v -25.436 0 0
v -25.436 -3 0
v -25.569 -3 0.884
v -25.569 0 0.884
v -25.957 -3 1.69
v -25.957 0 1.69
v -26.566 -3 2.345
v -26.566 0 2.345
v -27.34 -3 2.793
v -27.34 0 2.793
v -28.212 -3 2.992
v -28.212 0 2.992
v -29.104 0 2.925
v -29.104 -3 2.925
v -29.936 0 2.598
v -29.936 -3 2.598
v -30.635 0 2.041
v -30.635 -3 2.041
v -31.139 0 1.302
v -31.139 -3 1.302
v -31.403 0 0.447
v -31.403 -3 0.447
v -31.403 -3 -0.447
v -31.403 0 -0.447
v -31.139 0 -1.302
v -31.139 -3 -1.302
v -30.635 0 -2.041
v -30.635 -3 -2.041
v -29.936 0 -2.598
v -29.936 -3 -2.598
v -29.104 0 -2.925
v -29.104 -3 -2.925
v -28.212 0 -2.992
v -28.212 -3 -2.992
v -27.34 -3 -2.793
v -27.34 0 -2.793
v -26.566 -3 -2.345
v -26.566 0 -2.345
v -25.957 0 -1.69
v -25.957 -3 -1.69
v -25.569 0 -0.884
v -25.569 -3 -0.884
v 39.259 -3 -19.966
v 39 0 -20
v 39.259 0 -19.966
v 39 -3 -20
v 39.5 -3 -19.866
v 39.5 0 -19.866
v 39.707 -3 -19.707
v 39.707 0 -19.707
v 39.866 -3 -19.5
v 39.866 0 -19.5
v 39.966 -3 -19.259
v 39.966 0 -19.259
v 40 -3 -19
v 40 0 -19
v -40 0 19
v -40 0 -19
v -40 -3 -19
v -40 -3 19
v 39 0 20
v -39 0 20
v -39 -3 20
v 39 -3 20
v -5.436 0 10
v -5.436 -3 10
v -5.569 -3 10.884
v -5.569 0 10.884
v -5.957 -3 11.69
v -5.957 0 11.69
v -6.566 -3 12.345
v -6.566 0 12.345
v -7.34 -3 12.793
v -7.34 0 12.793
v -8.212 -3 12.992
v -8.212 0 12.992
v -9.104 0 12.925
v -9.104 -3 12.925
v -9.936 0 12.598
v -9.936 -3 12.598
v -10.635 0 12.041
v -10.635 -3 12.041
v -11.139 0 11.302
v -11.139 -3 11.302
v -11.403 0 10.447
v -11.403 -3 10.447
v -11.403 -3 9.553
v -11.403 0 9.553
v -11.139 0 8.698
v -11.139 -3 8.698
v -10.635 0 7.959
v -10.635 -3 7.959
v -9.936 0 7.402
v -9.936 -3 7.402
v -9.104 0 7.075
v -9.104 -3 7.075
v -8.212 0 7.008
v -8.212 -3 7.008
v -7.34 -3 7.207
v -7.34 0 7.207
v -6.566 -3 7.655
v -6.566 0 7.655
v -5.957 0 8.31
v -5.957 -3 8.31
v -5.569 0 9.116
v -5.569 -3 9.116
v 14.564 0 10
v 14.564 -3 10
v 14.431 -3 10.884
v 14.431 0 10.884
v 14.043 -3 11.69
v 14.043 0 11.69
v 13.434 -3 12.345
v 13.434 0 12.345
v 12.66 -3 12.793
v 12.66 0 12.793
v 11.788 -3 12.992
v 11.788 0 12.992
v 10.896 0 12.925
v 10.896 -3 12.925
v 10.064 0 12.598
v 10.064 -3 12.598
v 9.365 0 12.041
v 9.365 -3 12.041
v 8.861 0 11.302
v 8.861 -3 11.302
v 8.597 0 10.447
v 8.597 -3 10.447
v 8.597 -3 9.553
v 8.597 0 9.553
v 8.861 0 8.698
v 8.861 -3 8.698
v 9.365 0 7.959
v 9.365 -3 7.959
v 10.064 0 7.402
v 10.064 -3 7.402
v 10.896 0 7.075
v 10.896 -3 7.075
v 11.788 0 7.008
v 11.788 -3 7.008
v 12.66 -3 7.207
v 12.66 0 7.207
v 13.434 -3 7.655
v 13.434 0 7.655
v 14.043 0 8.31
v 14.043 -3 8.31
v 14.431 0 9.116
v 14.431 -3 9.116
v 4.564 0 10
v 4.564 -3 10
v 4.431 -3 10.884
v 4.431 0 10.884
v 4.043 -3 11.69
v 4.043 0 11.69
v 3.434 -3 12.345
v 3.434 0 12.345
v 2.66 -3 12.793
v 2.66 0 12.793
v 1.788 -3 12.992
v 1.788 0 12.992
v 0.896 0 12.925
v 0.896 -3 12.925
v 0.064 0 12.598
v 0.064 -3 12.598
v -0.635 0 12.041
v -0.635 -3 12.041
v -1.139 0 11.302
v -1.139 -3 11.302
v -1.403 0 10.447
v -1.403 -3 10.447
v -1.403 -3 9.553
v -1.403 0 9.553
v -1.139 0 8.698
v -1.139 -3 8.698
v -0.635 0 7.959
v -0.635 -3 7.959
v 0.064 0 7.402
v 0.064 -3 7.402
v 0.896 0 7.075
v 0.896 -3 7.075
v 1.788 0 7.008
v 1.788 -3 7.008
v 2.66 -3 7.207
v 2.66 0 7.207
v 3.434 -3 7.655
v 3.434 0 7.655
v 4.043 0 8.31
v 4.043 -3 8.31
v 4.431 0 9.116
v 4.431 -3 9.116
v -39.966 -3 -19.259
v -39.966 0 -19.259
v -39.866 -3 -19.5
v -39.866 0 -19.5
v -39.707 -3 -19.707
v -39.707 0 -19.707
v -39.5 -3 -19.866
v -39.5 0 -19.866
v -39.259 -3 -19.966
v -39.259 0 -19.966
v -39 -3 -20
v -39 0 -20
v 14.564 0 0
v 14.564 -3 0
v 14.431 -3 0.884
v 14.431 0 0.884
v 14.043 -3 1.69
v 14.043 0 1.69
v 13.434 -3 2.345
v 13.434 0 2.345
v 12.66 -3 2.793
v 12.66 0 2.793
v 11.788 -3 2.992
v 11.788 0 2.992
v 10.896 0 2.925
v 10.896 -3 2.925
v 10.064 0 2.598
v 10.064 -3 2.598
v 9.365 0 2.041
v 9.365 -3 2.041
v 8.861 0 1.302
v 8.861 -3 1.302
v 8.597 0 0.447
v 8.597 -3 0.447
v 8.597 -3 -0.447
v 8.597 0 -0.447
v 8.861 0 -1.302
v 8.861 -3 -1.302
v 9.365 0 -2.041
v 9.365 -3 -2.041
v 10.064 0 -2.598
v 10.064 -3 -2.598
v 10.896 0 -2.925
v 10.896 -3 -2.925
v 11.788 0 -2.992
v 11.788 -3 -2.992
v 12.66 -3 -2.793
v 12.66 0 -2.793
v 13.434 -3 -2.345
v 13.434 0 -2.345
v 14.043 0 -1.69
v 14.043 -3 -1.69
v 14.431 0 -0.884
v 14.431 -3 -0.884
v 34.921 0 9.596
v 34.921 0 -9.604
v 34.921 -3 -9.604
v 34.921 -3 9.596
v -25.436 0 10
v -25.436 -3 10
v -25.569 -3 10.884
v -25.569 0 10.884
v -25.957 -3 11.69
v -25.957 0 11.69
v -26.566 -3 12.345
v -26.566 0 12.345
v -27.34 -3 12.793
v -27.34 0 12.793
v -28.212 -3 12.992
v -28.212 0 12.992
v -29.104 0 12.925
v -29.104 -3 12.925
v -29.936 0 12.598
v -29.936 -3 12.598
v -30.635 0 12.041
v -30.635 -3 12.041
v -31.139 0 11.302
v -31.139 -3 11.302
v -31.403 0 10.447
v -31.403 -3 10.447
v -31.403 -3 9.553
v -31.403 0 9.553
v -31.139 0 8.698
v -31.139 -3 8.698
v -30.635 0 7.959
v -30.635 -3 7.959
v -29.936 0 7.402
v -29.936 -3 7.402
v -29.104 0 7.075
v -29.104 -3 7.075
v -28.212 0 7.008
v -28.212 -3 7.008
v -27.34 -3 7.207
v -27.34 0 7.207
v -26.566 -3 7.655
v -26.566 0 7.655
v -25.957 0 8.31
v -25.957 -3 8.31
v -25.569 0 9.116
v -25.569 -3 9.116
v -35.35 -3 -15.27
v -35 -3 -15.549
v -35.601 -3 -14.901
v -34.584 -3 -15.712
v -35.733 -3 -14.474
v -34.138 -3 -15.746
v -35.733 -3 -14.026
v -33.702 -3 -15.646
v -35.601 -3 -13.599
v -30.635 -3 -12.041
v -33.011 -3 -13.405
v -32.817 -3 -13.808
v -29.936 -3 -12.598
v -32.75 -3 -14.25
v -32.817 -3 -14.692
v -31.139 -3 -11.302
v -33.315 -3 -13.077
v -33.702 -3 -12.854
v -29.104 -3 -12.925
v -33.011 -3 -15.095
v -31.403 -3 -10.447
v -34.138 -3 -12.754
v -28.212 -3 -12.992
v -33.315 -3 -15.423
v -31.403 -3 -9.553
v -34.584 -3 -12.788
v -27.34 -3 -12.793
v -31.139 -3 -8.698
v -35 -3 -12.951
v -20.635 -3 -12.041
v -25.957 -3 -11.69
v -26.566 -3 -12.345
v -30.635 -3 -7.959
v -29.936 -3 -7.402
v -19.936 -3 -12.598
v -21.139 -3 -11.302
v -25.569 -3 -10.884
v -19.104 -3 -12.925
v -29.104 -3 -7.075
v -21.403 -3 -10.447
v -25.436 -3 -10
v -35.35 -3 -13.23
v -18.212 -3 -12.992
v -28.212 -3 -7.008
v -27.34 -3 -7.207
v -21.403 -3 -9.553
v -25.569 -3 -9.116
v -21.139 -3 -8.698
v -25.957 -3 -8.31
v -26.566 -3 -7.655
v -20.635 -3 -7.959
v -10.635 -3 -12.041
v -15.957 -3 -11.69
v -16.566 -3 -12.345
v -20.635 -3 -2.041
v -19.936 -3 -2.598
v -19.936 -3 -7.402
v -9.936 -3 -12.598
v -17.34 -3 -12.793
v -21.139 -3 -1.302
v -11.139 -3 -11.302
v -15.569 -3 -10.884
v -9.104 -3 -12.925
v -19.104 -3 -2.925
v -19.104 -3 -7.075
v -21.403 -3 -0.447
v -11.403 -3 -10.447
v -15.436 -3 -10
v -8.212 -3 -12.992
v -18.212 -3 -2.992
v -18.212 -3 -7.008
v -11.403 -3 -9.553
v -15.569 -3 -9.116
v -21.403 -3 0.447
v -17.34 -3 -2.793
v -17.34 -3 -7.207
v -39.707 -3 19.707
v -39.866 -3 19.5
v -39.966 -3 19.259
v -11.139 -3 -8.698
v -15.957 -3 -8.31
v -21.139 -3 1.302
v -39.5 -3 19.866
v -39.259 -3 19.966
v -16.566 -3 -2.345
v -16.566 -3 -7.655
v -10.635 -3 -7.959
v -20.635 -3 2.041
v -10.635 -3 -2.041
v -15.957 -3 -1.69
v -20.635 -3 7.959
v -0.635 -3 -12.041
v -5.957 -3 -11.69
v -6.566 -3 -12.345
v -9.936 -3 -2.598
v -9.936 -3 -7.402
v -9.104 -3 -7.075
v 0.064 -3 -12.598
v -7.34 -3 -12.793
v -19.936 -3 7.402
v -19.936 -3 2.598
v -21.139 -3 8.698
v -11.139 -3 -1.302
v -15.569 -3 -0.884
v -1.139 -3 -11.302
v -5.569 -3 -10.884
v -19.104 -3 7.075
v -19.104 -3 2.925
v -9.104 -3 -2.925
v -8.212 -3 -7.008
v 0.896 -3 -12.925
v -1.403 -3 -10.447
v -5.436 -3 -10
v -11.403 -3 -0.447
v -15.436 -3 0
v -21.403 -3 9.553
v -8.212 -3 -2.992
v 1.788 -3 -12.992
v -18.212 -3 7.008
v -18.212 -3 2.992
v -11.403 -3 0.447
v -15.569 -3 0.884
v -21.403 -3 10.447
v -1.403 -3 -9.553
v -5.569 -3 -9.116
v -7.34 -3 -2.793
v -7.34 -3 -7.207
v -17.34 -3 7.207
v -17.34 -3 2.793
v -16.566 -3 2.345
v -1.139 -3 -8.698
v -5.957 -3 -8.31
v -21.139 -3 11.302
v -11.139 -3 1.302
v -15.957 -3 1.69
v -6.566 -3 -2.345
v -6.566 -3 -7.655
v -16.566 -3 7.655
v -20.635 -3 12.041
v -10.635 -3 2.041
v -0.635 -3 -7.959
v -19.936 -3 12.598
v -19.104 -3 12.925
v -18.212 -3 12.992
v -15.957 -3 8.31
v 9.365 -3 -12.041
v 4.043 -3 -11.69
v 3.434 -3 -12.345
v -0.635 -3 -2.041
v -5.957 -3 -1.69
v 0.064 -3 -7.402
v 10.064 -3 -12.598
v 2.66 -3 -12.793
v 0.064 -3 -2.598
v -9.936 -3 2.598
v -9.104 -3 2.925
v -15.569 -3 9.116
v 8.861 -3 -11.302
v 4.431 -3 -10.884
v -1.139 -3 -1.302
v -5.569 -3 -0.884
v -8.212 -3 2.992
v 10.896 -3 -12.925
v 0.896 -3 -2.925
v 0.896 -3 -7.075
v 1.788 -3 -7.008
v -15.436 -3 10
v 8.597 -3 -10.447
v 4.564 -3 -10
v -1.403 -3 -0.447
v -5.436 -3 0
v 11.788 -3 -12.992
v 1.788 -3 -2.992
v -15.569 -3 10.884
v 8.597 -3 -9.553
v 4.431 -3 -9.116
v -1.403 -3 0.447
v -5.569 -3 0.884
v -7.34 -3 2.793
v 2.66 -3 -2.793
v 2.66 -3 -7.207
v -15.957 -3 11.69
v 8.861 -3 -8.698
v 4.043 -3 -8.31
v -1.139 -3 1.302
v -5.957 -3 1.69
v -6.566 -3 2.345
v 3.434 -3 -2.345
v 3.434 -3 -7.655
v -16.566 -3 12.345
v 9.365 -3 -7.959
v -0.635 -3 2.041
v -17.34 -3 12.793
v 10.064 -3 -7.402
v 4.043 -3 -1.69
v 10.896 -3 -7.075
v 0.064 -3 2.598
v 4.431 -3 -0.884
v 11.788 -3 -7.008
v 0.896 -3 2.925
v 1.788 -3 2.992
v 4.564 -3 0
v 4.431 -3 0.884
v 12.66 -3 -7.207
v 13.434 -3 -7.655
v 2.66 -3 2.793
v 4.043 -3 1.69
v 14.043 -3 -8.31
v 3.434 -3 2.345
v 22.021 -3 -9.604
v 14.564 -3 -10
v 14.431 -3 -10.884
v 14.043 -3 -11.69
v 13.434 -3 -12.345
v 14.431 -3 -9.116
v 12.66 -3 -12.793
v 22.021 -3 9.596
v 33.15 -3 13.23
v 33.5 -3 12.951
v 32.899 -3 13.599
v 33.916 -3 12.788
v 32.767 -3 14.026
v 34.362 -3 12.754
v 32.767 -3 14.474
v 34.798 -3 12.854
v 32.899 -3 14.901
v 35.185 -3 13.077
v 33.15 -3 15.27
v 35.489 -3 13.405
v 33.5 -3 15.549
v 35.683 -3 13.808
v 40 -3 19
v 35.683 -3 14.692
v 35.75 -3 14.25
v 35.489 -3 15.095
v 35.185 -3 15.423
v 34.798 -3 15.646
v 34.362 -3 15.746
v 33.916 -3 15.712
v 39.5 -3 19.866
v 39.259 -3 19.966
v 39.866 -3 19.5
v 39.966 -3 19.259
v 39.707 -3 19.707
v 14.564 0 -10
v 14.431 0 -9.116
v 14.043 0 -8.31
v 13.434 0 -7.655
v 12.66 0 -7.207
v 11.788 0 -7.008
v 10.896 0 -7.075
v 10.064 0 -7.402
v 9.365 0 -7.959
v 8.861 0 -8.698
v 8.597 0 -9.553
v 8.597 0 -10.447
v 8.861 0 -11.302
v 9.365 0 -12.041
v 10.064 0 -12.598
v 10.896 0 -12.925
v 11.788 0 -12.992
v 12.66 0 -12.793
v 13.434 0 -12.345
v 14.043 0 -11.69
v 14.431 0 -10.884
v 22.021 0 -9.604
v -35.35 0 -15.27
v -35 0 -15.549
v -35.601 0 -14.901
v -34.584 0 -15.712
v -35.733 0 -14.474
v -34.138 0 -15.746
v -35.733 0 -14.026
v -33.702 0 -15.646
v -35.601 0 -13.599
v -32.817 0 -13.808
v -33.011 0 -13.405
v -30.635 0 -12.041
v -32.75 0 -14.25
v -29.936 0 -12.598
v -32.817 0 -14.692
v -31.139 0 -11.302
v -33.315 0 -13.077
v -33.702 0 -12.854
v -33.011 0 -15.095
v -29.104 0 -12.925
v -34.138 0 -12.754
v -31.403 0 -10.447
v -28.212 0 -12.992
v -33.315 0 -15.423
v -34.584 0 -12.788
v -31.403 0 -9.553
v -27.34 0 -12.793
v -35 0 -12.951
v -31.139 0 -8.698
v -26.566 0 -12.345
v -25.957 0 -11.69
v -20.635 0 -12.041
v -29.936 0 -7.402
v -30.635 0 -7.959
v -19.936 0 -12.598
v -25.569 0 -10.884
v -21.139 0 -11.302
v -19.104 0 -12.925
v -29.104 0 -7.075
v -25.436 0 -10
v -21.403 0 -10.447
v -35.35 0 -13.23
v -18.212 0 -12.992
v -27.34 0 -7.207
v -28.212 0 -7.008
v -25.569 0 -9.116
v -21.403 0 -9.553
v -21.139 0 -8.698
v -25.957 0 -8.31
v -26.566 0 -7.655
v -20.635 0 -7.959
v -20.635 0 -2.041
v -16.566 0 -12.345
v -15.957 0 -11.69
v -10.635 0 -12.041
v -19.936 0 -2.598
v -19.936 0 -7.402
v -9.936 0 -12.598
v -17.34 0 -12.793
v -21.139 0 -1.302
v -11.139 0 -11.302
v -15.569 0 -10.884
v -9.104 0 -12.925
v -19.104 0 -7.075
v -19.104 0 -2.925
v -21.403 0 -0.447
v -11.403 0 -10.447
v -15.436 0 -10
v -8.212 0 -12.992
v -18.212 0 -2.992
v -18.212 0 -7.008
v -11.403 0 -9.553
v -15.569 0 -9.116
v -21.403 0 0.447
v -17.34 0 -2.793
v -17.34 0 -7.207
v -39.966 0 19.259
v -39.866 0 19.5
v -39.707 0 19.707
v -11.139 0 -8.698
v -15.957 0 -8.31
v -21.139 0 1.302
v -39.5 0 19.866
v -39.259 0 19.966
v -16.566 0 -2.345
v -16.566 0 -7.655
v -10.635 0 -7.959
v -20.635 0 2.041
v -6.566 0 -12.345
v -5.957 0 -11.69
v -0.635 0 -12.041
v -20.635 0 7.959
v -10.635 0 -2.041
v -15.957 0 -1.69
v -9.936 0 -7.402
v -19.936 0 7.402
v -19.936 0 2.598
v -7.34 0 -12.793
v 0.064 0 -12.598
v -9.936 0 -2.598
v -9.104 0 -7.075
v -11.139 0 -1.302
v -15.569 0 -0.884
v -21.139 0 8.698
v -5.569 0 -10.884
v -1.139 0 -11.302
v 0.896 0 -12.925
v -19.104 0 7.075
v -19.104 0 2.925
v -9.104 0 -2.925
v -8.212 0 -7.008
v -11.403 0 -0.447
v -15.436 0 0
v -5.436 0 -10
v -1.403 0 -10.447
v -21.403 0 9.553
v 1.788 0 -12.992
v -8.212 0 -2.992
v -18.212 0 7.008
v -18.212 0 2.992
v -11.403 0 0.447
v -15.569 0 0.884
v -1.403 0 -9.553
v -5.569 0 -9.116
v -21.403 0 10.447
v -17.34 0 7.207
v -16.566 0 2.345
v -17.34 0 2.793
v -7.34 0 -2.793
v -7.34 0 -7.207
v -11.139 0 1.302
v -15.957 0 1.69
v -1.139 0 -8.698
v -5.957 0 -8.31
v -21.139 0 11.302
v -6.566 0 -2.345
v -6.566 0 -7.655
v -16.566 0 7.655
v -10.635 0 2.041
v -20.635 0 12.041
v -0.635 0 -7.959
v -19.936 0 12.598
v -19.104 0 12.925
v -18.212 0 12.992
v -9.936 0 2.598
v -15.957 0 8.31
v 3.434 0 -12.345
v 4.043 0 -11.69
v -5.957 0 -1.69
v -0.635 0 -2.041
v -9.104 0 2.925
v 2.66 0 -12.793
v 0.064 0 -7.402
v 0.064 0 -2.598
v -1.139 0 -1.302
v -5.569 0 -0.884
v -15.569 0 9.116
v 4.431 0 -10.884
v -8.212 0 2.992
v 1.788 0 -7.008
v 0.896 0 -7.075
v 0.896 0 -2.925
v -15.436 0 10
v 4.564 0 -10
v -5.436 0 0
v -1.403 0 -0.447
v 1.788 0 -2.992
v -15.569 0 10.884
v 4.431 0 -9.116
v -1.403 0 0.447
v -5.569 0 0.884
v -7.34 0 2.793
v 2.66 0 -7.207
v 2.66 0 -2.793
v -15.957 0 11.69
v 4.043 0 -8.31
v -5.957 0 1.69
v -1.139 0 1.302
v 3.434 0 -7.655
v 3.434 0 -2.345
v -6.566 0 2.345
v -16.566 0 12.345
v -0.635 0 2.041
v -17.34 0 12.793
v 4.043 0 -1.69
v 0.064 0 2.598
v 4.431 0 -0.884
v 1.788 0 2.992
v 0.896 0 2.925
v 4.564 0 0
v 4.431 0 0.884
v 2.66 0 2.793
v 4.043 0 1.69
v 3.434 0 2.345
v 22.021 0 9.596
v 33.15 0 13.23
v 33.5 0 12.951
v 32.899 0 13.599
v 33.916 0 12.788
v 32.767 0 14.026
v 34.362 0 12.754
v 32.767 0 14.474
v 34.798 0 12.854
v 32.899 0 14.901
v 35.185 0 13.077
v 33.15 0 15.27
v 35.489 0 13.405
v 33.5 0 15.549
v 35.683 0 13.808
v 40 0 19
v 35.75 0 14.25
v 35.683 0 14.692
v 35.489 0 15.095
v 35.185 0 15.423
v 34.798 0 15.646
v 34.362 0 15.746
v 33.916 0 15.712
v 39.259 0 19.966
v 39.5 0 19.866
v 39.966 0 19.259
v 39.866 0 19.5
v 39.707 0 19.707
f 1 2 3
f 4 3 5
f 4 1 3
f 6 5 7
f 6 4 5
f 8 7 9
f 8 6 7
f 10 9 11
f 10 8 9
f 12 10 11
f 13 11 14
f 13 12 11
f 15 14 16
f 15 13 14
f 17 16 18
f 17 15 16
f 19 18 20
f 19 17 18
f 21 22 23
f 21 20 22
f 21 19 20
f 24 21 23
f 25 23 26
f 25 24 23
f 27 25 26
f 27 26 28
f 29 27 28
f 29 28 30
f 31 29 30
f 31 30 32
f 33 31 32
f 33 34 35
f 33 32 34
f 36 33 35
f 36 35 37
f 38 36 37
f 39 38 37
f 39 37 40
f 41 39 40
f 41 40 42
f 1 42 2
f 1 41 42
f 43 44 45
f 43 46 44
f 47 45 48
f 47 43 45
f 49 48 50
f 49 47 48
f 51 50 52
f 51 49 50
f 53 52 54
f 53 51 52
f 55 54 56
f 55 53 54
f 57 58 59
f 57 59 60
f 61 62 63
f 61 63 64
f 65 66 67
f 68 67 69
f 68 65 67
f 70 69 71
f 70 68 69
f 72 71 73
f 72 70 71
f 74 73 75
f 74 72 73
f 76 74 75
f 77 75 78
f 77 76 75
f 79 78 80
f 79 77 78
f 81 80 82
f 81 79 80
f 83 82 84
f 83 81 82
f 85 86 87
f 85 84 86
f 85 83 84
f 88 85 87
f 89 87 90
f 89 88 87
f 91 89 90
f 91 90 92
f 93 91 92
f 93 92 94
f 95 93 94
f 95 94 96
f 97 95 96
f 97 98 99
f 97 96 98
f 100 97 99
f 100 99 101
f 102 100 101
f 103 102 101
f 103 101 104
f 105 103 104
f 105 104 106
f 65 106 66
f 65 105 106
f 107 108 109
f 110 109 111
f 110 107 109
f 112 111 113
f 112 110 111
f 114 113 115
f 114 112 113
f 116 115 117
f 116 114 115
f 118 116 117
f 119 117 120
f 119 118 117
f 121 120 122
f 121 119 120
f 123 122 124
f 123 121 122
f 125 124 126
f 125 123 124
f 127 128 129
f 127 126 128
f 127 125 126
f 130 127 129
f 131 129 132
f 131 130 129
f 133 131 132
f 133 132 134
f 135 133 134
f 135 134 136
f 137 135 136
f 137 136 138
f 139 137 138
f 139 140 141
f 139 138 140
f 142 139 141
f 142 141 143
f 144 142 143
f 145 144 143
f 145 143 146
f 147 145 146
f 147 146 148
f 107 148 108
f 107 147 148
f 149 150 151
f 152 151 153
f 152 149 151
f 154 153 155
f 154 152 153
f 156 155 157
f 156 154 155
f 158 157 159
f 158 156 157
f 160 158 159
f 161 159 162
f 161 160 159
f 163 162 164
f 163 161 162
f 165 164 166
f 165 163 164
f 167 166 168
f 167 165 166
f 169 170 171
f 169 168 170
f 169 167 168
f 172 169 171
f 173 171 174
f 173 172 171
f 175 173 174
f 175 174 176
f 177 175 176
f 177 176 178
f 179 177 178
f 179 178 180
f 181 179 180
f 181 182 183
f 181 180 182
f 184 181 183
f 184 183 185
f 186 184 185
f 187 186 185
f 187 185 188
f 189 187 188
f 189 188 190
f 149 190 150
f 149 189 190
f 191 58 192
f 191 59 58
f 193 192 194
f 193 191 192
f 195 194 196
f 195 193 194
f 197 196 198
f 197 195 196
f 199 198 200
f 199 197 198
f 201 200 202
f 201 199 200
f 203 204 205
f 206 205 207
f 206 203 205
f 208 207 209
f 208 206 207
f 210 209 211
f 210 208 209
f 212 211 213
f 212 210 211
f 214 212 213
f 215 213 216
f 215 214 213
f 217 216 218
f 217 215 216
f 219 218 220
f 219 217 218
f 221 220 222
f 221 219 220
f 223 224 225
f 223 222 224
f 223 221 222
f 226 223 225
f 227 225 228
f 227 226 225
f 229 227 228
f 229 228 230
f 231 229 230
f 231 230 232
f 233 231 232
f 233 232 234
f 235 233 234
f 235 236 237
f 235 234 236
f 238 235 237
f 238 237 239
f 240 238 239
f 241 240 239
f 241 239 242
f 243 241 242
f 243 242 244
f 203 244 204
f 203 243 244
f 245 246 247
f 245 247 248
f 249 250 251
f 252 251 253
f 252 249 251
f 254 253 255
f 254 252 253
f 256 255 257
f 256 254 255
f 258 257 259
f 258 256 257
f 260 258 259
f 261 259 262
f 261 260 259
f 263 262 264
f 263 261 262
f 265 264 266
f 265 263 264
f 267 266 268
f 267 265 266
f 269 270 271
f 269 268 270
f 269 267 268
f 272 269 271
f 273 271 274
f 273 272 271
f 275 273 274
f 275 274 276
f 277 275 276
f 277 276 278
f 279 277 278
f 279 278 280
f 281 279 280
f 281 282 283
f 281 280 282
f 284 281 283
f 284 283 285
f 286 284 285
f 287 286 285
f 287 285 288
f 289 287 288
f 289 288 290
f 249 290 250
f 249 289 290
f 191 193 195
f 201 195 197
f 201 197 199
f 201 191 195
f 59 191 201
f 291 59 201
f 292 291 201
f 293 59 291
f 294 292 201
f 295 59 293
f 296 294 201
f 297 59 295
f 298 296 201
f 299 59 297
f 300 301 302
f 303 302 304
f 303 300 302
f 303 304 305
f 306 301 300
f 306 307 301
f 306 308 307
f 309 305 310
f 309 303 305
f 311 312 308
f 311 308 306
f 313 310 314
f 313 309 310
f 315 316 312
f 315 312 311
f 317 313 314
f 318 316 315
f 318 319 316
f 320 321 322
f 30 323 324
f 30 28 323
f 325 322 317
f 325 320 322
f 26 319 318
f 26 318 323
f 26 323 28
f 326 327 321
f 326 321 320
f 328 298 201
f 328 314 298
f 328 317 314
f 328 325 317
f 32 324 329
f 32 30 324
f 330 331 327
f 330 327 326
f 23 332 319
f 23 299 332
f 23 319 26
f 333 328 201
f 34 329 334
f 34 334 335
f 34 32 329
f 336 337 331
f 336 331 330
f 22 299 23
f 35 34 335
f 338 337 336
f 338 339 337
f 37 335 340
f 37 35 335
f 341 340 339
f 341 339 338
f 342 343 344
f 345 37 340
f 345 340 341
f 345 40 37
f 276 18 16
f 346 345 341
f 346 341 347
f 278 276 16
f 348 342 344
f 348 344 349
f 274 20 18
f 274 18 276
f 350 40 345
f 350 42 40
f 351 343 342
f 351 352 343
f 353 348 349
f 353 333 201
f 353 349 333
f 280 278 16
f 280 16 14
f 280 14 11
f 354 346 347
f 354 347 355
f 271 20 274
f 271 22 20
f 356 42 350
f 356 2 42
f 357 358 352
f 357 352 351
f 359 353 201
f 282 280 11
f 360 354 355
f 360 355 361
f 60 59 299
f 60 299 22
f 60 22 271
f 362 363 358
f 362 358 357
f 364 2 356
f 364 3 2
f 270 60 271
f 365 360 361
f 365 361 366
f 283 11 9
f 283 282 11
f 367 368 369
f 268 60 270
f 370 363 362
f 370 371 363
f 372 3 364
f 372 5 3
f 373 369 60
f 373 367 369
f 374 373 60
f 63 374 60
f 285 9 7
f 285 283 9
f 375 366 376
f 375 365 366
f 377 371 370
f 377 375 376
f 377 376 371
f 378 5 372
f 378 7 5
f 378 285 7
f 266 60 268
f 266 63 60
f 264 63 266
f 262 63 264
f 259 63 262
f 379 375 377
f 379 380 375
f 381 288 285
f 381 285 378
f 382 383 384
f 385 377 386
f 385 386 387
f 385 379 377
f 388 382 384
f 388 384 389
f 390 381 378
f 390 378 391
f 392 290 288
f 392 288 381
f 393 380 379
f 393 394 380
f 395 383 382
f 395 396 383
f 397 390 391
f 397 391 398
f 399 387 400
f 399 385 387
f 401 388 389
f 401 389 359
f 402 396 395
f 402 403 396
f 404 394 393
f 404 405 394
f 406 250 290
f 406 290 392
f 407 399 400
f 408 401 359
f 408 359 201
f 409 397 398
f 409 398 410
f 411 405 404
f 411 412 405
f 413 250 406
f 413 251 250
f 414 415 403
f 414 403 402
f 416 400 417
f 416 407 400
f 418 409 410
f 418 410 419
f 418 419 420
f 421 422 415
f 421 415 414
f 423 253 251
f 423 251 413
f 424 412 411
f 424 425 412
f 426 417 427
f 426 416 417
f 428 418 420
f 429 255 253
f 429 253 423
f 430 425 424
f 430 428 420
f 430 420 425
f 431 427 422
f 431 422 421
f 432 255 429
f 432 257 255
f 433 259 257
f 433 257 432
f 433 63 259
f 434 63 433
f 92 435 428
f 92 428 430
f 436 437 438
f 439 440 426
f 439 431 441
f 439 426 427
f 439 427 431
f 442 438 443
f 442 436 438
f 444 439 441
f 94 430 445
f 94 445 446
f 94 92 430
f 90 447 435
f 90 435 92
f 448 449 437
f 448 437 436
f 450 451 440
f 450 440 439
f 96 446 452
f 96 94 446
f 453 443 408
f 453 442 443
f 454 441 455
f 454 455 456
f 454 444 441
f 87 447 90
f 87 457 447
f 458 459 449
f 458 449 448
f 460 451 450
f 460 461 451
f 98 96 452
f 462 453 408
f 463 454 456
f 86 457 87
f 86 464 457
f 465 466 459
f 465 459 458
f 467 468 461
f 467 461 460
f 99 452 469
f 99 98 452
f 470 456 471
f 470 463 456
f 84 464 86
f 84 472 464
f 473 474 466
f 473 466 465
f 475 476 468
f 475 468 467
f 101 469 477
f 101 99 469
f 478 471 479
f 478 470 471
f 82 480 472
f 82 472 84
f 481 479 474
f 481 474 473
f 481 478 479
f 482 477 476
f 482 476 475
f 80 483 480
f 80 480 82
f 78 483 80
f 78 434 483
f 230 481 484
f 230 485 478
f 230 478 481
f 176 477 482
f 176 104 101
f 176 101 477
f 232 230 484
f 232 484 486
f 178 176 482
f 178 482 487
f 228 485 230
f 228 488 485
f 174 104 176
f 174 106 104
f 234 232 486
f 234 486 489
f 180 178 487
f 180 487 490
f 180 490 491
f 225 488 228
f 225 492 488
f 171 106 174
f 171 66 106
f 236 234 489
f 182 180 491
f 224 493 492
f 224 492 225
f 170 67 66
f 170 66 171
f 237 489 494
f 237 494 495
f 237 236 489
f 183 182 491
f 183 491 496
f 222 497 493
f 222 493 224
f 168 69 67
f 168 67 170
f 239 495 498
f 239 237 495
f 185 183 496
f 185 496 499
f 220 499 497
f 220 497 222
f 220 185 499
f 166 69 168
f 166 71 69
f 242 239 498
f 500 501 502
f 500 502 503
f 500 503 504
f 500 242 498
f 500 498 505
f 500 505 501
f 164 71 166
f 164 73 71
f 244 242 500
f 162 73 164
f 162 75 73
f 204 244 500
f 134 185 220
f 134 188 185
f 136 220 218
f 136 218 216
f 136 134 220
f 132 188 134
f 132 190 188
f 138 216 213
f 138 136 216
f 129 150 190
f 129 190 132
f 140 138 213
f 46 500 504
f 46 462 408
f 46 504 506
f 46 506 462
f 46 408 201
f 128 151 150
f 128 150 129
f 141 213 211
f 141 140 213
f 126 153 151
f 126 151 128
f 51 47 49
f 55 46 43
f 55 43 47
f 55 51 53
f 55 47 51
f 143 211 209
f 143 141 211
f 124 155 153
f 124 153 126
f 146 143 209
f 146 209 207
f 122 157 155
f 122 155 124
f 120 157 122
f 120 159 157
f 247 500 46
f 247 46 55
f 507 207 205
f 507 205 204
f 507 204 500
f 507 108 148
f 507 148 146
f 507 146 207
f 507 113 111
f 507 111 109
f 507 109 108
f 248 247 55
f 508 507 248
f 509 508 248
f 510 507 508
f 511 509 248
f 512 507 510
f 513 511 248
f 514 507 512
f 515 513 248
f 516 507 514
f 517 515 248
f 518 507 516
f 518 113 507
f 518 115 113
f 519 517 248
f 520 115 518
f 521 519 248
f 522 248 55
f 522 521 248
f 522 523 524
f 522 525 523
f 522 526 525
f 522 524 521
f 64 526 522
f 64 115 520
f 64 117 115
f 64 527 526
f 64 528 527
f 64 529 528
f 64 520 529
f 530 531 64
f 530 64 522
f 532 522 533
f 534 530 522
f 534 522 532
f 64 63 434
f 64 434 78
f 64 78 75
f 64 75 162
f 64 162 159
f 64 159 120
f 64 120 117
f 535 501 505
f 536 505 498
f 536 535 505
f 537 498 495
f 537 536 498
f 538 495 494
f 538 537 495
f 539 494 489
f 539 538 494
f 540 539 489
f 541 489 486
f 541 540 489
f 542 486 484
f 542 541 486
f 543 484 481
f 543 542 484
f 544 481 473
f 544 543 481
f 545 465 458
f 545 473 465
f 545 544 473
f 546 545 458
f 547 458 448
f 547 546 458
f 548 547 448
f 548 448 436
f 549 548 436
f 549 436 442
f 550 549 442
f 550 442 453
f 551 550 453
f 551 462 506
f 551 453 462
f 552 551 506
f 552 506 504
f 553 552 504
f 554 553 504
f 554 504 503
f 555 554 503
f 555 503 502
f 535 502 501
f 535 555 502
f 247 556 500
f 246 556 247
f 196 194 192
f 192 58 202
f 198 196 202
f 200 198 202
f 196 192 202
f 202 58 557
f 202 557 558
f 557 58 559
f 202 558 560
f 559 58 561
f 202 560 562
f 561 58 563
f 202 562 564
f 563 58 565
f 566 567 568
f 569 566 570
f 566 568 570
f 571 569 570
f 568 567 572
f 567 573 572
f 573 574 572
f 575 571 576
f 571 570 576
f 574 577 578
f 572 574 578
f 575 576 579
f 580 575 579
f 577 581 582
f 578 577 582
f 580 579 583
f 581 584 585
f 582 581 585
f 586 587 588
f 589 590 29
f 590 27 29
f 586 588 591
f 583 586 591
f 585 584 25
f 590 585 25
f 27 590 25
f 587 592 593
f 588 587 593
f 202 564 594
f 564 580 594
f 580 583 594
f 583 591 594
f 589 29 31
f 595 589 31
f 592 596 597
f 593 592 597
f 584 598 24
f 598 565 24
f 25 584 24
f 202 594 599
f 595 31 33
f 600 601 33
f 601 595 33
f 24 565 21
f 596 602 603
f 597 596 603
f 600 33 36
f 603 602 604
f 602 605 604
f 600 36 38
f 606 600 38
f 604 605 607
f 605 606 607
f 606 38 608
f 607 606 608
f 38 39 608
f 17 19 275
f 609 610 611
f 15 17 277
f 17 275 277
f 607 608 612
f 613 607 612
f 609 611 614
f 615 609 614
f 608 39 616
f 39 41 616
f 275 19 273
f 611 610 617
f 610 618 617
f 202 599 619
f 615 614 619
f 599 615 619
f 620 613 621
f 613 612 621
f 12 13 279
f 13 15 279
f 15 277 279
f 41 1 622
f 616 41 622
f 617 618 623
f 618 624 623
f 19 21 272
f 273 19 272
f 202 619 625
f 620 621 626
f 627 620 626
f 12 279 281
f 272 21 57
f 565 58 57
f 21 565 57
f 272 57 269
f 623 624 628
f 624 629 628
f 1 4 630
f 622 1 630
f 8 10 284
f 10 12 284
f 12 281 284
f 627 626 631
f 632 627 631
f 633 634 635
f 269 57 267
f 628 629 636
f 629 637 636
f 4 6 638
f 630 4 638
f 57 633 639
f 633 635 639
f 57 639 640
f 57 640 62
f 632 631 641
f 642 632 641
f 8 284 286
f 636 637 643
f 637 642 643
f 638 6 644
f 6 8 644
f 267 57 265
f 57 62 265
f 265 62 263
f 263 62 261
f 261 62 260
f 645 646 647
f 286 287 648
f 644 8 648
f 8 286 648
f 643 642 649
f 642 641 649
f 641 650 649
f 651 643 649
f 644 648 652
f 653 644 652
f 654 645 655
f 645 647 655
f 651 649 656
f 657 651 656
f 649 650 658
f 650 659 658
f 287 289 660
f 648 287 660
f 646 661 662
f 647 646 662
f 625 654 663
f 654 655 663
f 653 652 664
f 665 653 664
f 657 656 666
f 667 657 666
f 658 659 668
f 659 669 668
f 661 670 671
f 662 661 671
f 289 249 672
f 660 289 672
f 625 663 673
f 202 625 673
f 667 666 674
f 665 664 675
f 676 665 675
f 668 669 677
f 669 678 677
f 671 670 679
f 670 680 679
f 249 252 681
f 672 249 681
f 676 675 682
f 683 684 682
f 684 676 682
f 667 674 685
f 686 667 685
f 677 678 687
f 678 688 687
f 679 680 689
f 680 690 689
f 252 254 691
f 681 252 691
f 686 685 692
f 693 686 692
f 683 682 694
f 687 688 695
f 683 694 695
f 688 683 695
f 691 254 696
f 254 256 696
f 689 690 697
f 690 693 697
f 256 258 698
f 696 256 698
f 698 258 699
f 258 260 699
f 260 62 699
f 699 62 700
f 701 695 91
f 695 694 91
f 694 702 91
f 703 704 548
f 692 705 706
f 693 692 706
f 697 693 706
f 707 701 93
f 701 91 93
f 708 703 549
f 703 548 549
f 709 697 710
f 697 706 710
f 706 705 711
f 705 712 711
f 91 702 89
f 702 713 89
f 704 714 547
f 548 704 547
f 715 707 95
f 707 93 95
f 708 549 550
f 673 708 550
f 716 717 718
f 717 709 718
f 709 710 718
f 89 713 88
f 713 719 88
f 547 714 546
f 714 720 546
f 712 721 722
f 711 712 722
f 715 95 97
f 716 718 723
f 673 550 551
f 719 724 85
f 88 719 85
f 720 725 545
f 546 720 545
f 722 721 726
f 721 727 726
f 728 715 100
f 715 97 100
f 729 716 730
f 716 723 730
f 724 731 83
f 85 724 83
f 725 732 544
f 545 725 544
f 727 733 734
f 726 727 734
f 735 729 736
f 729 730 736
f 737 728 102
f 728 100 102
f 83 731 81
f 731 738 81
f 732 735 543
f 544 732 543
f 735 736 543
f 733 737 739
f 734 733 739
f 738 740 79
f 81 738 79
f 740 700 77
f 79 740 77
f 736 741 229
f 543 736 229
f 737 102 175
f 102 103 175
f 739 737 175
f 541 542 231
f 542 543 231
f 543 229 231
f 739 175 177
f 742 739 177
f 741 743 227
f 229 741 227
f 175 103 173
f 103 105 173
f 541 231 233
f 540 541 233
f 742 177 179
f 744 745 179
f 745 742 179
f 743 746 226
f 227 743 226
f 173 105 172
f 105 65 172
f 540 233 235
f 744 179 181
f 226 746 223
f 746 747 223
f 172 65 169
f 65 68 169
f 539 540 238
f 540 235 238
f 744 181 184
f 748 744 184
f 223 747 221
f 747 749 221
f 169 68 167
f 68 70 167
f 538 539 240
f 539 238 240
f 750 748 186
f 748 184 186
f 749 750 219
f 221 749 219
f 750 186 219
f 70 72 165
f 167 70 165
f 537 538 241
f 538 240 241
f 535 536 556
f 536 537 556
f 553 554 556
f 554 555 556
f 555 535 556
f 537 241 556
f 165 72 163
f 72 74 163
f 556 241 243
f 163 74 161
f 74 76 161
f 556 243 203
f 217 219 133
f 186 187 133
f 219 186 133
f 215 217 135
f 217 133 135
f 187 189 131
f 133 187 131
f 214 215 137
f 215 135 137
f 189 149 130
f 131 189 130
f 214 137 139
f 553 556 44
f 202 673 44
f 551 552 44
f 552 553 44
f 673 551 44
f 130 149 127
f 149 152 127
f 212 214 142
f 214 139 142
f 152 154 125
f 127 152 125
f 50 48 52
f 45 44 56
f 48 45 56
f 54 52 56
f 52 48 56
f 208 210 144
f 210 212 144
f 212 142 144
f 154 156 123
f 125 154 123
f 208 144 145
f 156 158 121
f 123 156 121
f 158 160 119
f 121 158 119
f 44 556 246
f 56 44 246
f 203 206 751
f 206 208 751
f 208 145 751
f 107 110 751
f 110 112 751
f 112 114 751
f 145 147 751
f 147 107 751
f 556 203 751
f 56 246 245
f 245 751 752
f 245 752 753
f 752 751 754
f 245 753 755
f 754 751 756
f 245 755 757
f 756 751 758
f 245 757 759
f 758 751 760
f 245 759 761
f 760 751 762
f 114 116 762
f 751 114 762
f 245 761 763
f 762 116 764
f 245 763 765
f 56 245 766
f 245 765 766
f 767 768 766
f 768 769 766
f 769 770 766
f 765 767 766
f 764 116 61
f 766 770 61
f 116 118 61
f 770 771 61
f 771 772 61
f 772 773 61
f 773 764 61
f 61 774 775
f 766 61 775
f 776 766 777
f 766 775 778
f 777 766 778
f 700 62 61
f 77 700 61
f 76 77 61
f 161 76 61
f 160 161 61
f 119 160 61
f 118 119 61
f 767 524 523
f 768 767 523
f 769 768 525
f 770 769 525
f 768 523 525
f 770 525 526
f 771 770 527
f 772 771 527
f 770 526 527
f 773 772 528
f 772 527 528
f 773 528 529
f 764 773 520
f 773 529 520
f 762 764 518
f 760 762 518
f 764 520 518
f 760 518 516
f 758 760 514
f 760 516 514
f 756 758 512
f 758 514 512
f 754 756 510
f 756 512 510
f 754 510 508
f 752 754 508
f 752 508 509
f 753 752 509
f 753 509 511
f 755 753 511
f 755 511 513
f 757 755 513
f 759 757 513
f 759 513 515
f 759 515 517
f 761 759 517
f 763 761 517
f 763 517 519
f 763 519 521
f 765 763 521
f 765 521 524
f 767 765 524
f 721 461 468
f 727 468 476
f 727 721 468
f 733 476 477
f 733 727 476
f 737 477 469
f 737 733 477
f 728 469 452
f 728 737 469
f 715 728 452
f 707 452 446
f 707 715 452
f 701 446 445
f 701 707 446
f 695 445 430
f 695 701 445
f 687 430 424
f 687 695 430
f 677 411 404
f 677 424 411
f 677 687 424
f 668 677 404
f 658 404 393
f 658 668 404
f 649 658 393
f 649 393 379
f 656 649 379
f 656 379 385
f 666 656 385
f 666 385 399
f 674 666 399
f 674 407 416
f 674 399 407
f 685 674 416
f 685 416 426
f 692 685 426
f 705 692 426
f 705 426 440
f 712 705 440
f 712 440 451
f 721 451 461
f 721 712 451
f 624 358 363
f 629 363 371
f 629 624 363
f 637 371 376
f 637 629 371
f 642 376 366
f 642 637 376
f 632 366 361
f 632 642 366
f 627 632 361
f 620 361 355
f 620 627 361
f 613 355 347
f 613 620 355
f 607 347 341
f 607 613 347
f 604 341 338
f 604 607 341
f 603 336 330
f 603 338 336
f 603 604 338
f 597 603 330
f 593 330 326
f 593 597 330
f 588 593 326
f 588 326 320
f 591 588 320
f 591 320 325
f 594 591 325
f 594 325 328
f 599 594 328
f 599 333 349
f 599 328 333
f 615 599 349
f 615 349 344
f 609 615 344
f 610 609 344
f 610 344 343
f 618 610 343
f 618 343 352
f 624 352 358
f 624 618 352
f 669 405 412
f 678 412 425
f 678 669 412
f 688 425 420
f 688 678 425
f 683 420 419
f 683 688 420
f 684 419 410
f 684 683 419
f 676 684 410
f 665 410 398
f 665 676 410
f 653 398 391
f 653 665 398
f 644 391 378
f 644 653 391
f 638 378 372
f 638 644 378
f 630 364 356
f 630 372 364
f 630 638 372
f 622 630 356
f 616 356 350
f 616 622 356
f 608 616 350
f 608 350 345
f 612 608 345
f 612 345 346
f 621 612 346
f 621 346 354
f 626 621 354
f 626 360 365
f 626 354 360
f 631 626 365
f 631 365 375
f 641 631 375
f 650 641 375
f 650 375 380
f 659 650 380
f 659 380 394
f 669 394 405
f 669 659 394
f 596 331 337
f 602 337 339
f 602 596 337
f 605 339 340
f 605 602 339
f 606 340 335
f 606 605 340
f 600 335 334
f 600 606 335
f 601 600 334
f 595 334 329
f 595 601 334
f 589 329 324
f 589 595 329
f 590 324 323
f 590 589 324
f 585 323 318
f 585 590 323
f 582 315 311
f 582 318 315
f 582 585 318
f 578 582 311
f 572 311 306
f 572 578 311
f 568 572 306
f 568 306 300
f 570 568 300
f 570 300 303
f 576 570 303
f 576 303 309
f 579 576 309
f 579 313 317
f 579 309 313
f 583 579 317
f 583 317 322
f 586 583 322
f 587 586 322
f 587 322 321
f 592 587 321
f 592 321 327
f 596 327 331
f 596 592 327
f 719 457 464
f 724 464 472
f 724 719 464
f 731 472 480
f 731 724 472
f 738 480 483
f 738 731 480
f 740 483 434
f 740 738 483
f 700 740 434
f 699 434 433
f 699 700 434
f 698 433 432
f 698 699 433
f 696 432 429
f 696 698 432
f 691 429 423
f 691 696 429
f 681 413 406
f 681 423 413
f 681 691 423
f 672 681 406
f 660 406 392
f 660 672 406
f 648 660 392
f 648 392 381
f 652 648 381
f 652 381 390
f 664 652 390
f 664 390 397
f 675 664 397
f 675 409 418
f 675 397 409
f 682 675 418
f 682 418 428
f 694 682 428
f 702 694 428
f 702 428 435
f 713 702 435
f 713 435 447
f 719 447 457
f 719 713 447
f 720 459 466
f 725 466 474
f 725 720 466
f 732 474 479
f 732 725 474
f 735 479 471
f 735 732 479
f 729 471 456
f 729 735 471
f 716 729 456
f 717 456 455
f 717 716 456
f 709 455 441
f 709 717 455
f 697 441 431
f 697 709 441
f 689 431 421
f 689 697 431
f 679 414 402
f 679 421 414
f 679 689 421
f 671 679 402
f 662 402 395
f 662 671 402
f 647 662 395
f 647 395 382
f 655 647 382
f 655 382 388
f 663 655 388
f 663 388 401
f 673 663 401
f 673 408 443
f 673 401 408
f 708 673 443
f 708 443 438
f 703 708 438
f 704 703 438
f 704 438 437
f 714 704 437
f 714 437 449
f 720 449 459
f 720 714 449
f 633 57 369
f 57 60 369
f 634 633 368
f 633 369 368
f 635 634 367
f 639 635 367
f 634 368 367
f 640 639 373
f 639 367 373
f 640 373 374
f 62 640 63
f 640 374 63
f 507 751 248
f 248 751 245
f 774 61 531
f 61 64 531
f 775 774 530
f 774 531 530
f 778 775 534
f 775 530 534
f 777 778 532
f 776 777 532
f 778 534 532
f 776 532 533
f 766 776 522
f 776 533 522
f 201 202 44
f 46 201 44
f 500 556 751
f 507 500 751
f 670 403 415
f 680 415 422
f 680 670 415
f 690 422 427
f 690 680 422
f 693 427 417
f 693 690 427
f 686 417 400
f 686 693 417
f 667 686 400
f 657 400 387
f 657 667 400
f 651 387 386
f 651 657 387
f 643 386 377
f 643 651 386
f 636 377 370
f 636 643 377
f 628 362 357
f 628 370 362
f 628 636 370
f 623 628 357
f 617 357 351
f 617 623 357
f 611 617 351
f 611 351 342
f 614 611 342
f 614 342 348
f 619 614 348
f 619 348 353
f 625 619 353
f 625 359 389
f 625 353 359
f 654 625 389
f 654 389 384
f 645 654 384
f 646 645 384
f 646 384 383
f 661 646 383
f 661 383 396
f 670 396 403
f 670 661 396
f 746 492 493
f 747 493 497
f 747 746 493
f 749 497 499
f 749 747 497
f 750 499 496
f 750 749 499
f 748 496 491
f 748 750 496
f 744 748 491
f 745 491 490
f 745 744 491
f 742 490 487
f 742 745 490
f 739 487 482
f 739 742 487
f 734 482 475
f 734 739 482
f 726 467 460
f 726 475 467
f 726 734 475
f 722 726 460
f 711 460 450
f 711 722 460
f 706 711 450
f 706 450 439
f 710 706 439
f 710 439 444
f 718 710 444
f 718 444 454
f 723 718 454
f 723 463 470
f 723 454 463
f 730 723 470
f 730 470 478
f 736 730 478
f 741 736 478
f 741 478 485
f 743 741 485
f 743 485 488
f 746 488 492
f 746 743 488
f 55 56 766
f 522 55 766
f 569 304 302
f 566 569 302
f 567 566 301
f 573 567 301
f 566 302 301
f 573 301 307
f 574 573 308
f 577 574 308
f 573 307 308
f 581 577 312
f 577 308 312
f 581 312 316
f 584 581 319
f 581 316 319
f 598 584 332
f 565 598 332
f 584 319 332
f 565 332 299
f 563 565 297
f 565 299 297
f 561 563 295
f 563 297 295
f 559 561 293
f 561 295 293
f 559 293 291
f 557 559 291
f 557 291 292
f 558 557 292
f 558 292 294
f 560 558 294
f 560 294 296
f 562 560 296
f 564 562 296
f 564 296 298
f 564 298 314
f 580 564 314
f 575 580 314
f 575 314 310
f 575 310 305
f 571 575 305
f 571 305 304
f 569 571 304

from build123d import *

# Parameters (mm, degrees)
F0_W     = 80
F0_H     = 40
F2_DEPTH = 3
F1_R     = 3
F1_W     = 12.9
F1_H     = 19.2
F3_DEPTH = 3.001
F4_R     = 1
F5_R     = 1.5
F6_DEPTH = 25


with BuildPart() as f2:
    # F0 (on Front) → F2 (new body)
    with BuildSketch(Plane.XZ):
        Rectangle(F0_W, F0_H)
    extrude(amount=F2_DEPTH)

    # F1 (on face) → F3 (cut, through all)
    with BuildSketch(Plane.XZ):
        with Locations((-28.43621, 10)):
            Circle(F1_R)
        with Locations((-28.43621, 0)):
            Circle(F1_R)
        with Locations((-28.43621, -10)):
            Circle(F1_R)
        with Locations((-18.43621, 10)):
            Circle(F1_R)
        with Locations((-18.43621, 0)):
            Circle(F1_R)
        with Locations((-18.43621, -10)):
            Circle(F1_R)
        with Locations((-8.43621, 10)):
            Circle(F1_R)
        with Locations((-8.43621, 0)):
            Circle(F1_R)
        with Locations((-8.43621, -10)):
            Circle(F1_R)
        with Locations((1.56379, 10)):
            Circle(F1_R)
        with Locations((1.56379, 0)):
            Circle(F1_R)
        with Locations((1.56379, -10)):
            Circle(F1_R)
        with Locations((11.56379, 10)):
            Circle(F1_R)
        with Locations((11.56379, 0)):
            Circle(F1_R)
        with Locations((11.56379, -10)):
            Circle(F1_R)
        with Locations((28.4711, -0.004033)):
            Rectangle(F1_W, F1_H)
    extrude(amount=F3_DEPTH, mode=Mode.SUBTRACT)

    # F4
    f4_edges = [f2.edges().sort_by_distance(p)[0] for p in [
        (-40, -1.5, 20),
        (40, -1.5, 20),
        (40, -1.5, -20),
        (-40, -1.5, -20),
    ]]
    fillet(f4_edges, radius=F4_R)

    # F5 (on face) → F6 (cut)
    with BuildSketch(Plane.XZ.offset(3)):
        with Locations((34.25, 14.25)):
            Circle(F5_R)
        with Locations((-34.25, -14.25)):
            Circle(F5_R)
    extrude(amount=-F6_DEPTH, mode=Mode.SUBTRACT)


solid = f2.part
